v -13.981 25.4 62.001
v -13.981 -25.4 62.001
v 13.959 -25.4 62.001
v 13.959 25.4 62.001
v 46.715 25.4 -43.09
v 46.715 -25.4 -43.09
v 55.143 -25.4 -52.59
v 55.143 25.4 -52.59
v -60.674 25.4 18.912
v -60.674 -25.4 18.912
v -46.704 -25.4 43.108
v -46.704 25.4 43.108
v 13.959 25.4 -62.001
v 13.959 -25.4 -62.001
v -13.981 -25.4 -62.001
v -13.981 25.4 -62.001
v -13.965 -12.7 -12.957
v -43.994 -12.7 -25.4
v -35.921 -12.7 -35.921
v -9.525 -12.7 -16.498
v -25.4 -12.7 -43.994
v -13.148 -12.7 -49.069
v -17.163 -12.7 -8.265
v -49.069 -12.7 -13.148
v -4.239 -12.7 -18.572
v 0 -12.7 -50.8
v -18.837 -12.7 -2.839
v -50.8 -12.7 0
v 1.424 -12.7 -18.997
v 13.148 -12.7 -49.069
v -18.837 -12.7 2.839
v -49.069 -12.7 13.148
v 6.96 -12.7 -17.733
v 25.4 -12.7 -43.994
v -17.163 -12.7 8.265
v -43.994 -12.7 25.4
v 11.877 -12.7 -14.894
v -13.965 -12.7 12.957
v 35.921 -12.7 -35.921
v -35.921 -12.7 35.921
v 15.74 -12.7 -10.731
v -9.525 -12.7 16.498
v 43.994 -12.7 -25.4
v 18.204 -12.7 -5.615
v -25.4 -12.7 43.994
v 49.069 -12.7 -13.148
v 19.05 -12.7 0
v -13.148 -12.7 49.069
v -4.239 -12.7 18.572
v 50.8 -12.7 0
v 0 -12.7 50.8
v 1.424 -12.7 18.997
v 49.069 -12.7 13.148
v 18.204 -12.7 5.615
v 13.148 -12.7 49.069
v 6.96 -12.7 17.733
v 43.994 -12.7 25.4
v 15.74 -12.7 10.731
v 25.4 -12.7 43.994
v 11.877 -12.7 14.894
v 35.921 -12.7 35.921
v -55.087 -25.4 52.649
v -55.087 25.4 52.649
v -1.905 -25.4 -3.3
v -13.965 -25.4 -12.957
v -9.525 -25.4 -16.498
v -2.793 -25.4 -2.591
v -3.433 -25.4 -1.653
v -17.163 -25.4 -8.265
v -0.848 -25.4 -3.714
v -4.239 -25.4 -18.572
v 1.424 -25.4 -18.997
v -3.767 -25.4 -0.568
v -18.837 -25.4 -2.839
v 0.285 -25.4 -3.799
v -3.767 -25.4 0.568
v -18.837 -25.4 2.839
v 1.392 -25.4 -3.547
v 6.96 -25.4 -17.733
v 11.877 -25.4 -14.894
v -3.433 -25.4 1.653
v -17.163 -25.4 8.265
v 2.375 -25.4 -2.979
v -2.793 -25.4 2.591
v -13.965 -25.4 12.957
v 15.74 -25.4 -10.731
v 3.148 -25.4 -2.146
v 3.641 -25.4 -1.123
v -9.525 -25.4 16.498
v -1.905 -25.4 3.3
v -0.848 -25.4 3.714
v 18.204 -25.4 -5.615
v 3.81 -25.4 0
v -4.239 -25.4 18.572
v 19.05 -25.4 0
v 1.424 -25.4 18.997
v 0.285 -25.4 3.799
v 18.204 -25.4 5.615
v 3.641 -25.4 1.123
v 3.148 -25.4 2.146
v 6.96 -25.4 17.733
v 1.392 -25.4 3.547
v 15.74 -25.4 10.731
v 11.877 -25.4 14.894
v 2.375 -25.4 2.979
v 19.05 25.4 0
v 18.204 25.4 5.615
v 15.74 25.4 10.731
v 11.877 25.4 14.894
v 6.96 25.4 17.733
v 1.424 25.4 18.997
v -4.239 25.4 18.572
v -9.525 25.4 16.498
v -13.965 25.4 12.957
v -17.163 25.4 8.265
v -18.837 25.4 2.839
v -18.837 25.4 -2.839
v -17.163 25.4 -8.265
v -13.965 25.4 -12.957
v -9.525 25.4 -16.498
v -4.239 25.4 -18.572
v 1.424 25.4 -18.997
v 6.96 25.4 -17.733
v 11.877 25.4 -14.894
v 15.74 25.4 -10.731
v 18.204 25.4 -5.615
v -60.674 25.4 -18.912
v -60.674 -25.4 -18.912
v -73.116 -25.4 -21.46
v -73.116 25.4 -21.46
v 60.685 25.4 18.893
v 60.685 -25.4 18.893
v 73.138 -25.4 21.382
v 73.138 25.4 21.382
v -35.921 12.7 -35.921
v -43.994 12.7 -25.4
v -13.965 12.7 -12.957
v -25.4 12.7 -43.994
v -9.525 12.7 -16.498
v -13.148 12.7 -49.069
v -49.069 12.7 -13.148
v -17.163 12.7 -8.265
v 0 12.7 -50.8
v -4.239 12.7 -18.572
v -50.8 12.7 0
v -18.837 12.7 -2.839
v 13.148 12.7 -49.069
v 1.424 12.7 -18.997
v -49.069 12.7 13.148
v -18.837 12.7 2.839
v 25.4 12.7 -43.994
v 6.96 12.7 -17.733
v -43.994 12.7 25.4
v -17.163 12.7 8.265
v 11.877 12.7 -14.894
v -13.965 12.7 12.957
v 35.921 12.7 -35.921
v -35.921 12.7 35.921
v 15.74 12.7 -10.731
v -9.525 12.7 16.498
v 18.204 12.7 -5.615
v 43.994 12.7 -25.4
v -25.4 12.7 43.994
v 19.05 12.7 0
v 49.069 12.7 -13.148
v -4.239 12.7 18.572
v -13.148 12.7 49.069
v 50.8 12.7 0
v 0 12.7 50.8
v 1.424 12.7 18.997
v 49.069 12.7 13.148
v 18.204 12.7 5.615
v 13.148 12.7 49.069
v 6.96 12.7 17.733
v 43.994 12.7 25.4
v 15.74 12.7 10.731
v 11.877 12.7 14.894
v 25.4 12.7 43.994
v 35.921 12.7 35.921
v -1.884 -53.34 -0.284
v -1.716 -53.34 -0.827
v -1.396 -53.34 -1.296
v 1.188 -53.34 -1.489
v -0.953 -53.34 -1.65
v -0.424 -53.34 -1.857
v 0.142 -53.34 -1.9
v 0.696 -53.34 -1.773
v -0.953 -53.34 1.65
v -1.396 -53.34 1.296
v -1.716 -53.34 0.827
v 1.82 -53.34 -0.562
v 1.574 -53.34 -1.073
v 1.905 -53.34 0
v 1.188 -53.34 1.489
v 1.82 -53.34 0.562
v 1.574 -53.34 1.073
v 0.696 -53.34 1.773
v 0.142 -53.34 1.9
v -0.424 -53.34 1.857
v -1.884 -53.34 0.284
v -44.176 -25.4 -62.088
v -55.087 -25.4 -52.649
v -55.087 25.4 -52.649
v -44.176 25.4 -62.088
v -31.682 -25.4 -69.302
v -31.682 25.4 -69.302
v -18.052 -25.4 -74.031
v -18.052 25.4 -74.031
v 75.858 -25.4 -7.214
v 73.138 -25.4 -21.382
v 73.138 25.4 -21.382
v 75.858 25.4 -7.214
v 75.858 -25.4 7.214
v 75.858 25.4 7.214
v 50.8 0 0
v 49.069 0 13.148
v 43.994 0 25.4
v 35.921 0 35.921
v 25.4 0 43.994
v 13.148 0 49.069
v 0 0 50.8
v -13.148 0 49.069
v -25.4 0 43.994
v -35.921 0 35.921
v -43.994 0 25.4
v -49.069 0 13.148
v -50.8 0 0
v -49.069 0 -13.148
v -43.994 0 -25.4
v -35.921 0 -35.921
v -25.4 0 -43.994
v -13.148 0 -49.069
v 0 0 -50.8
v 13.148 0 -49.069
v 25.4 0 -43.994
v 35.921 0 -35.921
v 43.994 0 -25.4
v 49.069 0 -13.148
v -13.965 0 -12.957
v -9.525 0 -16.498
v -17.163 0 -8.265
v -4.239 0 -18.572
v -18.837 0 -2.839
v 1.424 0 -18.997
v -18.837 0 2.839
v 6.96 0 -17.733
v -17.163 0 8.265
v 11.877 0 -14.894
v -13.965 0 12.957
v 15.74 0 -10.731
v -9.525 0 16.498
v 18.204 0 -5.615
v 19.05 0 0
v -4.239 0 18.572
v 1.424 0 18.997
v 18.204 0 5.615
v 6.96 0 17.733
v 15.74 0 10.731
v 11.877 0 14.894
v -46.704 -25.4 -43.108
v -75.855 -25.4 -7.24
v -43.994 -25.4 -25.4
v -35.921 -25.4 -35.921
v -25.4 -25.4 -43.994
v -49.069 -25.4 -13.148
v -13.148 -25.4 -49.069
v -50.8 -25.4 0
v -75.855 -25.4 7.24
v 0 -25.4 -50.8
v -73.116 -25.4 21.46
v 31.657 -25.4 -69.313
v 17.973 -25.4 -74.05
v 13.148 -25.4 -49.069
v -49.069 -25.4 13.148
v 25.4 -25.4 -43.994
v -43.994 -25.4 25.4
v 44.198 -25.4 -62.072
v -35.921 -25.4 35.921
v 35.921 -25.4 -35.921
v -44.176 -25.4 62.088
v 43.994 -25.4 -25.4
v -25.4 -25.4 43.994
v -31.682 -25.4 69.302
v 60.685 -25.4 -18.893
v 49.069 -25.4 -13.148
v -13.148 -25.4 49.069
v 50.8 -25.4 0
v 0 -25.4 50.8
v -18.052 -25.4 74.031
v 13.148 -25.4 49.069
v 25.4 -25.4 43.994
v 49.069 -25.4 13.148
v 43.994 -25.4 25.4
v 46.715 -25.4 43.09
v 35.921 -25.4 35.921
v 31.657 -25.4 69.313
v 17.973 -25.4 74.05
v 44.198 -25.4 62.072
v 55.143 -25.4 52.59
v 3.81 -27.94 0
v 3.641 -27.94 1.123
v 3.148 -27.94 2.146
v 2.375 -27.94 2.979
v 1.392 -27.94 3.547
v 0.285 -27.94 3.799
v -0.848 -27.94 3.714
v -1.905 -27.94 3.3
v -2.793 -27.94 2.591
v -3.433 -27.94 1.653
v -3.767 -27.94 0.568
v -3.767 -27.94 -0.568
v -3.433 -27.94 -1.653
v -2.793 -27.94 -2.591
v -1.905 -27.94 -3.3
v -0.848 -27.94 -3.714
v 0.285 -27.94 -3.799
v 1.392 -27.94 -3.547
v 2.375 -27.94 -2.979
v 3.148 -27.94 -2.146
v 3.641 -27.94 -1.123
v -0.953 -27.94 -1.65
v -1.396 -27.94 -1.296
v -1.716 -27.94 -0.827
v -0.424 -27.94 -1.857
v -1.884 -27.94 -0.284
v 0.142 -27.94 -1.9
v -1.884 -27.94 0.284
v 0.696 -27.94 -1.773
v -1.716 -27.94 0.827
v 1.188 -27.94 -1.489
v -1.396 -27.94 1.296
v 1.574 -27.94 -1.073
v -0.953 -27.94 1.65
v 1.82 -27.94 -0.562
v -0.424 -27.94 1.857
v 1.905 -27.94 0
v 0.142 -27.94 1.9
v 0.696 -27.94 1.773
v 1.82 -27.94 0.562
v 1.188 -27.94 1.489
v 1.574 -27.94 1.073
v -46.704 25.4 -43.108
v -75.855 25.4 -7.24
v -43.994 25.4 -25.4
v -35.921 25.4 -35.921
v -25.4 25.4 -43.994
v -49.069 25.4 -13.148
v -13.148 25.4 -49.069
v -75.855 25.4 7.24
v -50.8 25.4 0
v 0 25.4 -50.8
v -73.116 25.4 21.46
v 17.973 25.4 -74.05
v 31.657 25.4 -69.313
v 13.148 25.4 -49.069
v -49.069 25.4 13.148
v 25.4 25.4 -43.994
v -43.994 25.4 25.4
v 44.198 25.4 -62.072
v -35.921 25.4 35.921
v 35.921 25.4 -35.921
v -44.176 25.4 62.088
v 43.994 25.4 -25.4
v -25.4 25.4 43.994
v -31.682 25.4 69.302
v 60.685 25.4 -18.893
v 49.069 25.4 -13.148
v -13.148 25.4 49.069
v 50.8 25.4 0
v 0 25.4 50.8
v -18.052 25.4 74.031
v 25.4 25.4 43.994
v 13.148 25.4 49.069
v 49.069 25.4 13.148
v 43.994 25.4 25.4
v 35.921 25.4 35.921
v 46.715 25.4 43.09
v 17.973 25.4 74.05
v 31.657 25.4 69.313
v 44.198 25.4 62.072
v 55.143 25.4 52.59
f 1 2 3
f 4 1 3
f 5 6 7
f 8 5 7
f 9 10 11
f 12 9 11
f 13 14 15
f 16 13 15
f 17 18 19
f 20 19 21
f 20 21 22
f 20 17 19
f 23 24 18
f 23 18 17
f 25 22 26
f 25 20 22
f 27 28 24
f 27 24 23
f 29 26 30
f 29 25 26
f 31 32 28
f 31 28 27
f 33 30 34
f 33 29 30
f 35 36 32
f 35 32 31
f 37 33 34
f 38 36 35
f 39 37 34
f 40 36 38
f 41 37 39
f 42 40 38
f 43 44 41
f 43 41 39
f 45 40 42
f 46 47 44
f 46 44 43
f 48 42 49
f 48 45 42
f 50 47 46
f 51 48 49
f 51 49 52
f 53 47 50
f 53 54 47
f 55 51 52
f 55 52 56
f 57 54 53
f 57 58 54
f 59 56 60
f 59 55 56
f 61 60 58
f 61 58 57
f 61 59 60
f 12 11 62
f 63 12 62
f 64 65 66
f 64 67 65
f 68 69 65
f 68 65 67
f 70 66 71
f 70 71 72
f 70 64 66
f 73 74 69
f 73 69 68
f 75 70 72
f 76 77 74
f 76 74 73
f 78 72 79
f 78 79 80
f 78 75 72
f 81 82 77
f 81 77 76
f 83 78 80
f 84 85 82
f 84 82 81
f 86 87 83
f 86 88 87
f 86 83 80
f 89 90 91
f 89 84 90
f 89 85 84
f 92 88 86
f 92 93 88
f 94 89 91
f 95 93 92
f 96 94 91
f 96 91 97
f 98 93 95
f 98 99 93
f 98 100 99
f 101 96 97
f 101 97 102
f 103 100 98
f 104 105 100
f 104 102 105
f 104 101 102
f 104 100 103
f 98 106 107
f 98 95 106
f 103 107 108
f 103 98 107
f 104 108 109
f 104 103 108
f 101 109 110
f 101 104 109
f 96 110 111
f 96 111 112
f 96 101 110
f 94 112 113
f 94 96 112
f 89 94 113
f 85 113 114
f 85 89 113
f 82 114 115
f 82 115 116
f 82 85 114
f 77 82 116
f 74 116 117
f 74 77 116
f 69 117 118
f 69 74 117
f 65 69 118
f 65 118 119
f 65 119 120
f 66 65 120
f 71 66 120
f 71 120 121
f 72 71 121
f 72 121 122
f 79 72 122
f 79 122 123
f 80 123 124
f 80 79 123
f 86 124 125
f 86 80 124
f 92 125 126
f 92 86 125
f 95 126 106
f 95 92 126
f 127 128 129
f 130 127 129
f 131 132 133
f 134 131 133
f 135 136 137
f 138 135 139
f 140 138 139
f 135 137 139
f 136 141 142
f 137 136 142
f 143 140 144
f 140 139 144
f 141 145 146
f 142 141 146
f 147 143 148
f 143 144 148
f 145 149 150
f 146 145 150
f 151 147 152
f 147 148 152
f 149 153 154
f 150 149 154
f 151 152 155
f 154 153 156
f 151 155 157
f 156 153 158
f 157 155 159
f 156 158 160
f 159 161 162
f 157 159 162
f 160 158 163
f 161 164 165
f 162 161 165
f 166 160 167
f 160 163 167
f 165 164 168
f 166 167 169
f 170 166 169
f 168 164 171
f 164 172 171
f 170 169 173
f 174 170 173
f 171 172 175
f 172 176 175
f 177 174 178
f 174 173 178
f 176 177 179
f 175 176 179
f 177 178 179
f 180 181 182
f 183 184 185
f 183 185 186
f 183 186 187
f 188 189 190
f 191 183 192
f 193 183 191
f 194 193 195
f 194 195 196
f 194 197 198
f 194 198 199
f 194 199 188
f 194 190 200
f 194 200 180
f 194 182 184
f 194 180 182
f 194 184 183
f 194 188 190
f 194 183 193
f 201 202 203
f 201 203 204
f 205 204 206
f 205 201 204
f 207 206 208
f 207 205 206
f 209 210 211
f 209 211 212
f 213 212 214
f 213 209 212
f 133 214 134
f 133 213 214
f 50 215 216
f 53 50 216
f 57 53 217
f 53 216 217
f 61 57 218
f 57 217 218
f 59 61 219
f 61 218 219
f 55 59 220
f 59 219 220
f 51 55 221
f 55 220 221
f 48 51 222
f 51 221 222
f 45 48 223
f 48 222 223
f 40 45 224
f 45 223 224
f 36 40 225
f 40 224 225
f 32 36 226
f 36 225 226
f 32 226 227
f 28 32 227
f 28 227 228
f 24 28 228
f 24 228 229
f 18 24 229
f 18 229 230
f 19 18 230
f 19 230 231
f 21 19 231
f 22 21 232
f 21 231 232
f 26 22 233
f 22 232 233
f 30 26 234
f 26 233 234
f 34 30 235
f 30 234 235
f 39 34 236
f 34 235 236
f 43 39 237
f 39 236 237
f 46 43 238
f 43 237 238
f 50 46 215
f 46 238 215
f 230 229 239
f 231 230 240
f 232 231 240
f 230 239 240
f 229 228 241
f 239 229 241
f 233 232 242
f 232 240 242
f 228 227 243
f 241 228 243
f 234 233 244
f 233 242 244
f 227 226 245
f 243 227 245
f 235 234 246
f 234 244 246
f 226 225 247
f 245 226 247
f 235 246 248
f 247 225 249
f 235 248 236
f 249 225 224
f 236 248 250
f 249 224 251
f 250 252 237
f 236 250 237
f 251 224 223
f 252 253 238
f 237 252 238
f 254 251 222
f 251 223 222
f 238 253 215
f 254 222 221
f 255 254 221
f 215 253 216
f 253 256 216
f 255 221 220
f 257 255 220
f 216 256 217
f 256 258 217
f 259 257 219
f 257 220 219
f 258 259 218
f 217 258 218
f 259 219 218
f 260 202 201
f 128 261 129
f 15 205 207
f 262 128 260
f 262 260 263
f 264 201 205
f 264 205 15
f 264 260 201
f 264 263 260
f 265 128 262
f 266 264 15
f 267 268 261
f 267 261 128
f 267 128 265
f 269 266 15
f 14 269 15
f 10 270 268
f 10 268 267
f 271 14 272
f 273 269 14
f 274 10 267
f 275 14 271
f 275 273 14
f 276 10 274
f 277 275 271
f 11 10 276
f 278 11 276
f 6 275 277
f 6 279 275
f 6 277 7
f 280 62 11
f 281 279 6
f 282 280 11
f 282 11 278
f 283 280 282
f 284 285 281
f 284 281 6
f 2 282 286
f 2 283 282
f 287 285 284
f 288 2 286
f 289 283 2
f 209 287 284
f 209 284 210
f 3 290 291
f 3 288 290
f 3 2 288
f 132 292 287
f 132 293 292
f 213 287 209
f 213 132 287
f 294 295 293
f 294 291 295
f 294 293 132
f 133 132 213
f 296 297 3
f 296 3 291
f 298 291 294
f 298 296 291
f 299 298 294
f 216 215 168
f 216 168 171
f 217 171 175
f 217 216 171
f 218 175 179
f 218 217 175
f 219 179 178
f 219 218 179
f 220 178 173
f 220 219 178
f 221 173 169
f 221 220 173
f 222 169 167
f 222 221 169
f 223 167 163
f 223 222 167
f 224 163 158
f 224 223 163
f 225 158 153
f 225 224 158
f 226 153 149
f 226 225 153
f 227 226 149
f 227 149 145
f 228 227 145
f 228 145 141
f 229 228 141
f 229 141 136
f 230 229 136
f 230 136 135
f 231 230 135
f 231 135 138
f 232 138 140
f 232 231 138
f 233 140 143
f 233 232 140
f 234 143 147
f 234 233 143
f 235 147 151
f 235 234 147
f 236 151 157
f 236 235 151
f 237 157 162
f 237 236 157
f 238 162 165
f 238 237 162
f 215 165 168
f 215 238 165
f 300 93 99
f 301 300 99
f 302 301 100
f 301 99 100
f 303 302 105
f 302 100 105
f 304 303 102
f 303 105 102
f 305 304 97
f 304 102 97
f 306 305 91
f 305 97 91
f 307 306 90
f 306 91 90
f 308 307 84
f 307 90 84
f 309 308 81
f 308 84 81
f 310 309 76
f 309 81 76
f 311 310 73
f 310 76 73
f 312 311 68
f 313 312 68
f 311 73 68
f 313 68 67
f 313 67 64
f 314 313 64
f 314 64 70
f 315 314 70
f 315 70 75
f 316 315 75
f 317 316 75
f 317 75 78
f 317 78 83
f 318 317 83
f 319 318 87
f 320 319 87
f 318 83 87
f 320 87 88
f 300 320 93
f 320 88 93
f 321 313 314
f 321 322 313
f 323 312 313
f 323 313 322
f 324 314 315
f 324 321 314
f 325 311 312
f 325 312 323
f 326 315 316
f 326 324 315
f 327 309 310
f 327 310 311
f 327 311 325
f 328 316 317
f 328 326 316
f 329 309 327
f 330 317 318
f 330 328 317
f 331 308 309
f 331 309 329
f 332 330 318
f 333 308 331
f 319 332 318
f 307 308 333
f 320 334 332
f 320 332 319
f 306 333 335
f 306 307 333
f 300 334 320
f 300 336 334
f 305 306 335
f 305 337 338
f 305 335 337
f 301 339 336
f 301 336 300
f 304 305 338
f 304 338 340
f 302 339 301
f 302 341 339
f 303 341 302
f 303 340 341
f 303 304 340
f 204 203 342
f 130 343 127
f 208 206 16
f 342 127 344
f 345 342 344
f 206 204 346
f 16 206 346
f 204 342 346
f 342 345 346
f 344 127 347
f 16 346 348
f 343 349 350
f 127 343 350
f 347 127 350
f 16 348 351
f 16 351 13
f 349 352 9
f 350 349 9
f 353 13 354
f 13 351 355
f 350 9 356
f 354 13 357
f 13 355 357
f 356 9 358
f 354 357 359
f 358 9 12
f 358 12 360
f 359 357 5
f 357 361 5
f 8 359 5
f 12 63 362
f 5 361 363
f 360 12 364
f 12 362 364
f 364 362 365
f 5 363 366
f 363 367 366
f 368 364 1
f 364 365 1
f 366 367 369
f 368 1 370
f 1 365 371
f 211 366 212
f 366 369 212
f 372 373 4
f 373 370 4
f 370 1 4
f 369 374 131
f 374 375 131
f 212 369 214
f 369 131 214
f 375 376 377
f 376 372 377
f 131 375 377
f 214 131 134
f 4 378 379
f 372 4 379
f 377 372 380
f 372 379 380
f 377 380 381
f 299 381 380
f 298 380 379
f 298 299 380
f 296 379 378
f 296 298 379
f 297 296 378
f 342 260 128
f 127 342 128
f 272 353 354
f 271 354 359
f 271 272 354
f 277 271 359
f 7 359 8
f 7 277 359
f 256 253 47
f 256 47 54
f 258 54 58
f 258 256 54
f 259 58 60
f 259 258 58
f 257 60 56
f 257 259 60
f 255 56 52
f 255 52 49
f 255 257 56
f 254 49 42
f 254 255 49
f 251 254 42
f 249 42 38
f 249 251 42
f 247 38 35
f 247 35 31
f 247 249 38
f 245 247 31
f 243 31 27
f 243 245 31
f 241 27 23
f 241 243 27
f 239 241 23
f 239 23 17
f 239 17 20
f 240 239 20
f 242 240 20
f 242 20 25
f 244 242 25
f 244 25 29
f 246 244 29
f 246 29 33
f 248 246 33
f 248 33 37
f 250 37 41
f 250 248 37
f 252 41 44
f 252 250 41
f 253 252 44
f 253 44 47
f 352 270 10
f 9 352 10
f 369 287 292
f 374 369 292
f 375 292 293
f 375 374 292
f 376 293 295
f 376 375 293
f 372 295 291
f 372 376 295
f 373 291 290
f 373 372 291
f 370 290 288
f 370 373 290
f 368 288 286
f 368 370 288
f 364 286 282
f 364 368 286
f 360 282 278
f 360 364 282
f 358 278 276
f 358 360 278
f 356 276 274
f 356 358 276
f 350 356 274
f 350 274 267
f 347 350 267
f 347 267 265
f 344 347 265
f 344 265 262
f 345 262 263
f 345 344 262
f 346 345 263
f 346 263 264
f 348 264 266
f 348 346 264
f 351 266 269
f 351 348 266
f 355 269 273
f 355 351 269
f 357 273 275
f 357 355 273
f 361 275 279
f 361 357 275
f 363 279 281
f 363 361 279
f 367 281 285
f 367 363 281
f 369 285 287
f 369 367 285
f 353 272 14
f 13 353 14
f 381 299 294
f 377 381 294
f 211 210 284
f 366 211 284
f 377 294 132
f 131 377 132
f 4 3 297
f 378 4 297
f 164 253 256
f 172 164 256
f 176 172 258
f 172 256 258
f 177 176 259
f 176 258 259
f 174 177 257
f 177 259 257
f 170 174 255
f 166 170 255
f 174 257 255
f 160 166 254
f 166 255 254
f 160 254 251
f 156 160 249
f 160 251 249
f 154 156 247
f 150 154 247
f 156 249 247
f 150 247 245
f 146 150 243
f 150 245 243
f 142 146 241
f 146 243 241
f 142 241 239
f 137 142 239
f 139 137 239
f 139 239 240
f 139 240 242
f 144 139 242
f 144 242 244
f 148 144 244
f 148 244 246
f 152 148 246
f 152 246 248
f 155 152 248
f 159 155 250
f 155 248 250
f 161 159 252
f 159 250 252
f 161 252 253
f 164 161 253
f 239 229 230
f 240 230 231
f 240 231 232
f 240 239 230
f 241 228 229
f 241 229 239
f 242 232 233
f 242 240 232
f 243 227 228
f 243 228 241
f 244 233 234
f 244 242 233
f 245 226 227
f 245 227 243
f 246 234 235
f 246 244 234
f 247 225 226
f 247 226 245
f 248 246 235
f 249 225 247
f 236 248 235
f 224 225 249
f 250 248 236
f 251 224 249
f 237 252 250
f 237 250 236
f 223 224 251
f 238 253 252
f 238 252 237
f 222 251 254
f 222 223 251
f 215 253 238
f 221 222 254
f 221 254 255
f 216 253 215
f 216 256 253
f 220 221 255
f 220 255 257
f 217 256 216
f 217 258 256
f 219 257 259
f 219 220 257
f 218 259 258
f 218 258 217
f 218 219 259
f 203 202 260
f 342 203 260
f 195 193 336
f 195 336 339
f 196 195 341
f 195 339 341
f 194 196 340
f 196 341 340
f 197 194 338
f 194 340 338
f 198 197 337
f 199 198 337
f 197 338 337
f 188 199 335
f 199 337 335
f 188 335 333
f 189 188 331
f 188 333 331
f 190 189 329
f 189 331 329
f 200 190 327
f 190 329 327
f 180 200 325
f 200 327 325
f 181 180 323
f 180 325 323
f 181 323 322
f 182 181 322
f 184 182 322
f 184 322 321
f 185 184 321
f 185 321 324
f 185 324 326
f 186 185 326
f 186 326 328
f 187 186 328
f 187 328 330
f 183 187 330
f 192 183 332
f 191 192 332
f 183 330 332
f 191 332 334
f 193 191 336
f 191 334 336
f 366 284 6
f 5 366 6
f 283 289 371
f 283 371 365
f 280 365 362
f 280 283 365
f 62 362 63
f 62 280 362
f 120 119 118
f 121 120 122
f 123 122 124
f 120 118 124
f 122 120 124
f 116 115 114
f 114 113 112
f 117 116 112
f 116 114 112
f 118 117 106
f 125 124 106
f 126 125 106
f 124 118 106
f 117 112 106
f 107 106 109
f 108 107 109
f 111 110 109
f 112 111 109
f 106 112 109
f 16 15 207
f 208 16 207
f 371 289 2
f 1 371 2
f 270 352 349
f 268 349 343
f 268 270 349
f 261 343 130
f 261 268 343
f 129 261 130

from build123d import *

# Parameters (mm, degrees)
F0_R      = 76.2
F0_R_2    = 50.8
F1_DEPTH  = 25.4
F0_R_3    = 19.05
F2_DEPTH  = 25.4
F3_DEPTH  = 25.4
F4_DEPTH  = 25.4
F5_DEPTH  = 12.7
F6_DEPTH  = 12.7
F8_DEPTH  = 50.801
F10_DEPTH = 50.801
F11_R     = 3.81
F12_DEPTH = 2.54
F13_R     = 1.905
F14_DEPTH = 25.4


with BuildPart() as f1:
    # F0 (on Front) → F1 (new body)
    with BuildSketch(Plane.XZ):
        Circle(F0_R)
        Circle(F0_R_2, mode=Mode.SUBTRACT)
    extrude(amount=F1_DEPTH)

    # F0 (on Front) → F4 (join)
    with BuildSketch(Plane.XZ):
        Circle(F0_R)
        Circle(F0_R_2, mode=Mode.SUBTRACT)
    extrude(amount=-F4_DEPTH)

    # F7 (on face) → F8 (cut, through all)
    with BuildSketch(Plane.XZ.offset(25.4)):
        with BuildLine():
            ThreePointArc((17.9730040468, 74.0500582412), (-0.0404237291, 76.1999892777), (-18.0515603106, 74.0309473825))
            Line((-18.0515603106, 74.0309473825), (-13.9808183694, 62.0010238562))
            Line((-13.9808183694, 62.0010238562), (13.9591816306, 62.0010238562))
            Line((13.9591816306, 62.0010238562), (17.9730040468, 74.0500582412))
        make_face()
        with BuildLine():
            Line((-60.6740525355, -18.91150602), (-73.1157336121, -21.4599510337))
            ThreePointArc((-73.1157336121, -21.4599510337), (-65.970914618, -38.1350026152), (-55.0869009442, -52.6485834982))
            Line((-55.0869009442, -52.6485834982), (-46.7040525355, -43.1082558017))
            Line((-46.7040525355, -43.1082558017), (-60.6740525355, -18.91150602))
        make_face()
        with BuildLine():
            ThreePointArc((55.1427295652, -52.5901072075), (66.0113383471, -38.0649866625), (73.1384612548, -21.3823638844))
            Line((73.1384612548, -21.3823638844), (60.6848709048, -18.8927680545))
            Line((60.6848709048, -18.8927680545), (46.7148709048, -43.0895178363))
            Line((46.7148709048, -43.0895178363), (55.1427295652, -52.5901072075))
        make_face()
    extrude(amount=-F8_DEPTH, mode=Mode.SUBTRACT)

    # F9 (on face) → F10 (cut, through all)
    with BuildSketch(Plane.XZ.offset(25.4)):
        with BuildLine():
            ThreePointArc((-55.0869009442, 52.6485834982), (-65.970914618, 38.1350026152), (-73.1157336121, 21.4599510337))
            Line((-73.1157336121, 21.4599510337), (-60.6740525355, 18.91150602))
            Line((-60.6740525355, 18.91150602), (-46.7040525355, 43.1082558017))
            Line((-46.7040525355, 43.1082558017), (-55.0869009442, 52.6485834982))
        make_face()
        with BuildLine():
            Line((60.6848709048, 18.8927680545), (73.1384612548, 21.3823638844))
            ThreePointArc((73.1384612548, 21.3823638844), (66.0113383471, 38.0649866625), (55.1427295652, 52.5901072075))
            Line((55.1427295652, 52.5901072075), (46.7148709048, 43.0895178363))
            Line((46.7148709048, 43.0895178363), (60.6848709048, 18.8927680545))
        make_face()
        with BuildLine():
            Line((-13.9808183694, -62.0010238562), (-18.0515603106, -74.0309473825))
            ThreePointArc((-18.0515603106, -74.0309473825), (-0.0404237291, -76.1999892777), (17.9730040468, -74.0500582412))
            Line((17.9730040468, -74.0500582412), (13.9591816306, -62.0010238562))
            Line((13.9591816306, -62.0010238562), (-13.9808183694, -62.0010238562))
        make_face()
    extrude(amount=-F10_DEPTH, mode=Mode.SUBTRACT)


with BuildPart() as f2:
    # F0 (on Front) → F2 (new body)
    with BuildSketch(Plane.XZ):
        Circle(F0_R_3)
    extrude(amount=F2_DEPTH)

    # F0 (on Front) → F3 (join)
    with BuildSketch(Plane.XZ):
        Circle(F0_R_3)
    extrude(amount=-F3_DEPTH)

    # F11 (on face) → F12 (join)
    with BuildSketch(Plane.XZ.offset(25.4)):
        Circle(F11_R)
    extrude(amount=F12_DEPTH)

    # F13 (on face) → F14 (join)
    with BuildSketch(Plane.XZ.offset(27.94)):
        Circle(F13_R)
    extrude(amount=F14_DEPTH)


with BuildPart() as f5:
    # F0 (on Front) → F5 (new body)
    with BuildSketch(Plane.XZ):
        Circle(F0_R_2)
        Circle(F0_R_3, mode=Mode.SUBTRACT)
    extrude(amount=F5_DEPTH)


with BuildPart() as f6:
    # F0 (on Front) → F6 (new body)
    with BuildSketch(Plane.XZ):
        Circle(F0_R_2)
        Circle(F0_R_3, mode=Mode.SUBTRACT)
    extrude(amount=-F6_DEPTH)


solid = Compound([f1.part, f2.part, f5.part, f6.part])
